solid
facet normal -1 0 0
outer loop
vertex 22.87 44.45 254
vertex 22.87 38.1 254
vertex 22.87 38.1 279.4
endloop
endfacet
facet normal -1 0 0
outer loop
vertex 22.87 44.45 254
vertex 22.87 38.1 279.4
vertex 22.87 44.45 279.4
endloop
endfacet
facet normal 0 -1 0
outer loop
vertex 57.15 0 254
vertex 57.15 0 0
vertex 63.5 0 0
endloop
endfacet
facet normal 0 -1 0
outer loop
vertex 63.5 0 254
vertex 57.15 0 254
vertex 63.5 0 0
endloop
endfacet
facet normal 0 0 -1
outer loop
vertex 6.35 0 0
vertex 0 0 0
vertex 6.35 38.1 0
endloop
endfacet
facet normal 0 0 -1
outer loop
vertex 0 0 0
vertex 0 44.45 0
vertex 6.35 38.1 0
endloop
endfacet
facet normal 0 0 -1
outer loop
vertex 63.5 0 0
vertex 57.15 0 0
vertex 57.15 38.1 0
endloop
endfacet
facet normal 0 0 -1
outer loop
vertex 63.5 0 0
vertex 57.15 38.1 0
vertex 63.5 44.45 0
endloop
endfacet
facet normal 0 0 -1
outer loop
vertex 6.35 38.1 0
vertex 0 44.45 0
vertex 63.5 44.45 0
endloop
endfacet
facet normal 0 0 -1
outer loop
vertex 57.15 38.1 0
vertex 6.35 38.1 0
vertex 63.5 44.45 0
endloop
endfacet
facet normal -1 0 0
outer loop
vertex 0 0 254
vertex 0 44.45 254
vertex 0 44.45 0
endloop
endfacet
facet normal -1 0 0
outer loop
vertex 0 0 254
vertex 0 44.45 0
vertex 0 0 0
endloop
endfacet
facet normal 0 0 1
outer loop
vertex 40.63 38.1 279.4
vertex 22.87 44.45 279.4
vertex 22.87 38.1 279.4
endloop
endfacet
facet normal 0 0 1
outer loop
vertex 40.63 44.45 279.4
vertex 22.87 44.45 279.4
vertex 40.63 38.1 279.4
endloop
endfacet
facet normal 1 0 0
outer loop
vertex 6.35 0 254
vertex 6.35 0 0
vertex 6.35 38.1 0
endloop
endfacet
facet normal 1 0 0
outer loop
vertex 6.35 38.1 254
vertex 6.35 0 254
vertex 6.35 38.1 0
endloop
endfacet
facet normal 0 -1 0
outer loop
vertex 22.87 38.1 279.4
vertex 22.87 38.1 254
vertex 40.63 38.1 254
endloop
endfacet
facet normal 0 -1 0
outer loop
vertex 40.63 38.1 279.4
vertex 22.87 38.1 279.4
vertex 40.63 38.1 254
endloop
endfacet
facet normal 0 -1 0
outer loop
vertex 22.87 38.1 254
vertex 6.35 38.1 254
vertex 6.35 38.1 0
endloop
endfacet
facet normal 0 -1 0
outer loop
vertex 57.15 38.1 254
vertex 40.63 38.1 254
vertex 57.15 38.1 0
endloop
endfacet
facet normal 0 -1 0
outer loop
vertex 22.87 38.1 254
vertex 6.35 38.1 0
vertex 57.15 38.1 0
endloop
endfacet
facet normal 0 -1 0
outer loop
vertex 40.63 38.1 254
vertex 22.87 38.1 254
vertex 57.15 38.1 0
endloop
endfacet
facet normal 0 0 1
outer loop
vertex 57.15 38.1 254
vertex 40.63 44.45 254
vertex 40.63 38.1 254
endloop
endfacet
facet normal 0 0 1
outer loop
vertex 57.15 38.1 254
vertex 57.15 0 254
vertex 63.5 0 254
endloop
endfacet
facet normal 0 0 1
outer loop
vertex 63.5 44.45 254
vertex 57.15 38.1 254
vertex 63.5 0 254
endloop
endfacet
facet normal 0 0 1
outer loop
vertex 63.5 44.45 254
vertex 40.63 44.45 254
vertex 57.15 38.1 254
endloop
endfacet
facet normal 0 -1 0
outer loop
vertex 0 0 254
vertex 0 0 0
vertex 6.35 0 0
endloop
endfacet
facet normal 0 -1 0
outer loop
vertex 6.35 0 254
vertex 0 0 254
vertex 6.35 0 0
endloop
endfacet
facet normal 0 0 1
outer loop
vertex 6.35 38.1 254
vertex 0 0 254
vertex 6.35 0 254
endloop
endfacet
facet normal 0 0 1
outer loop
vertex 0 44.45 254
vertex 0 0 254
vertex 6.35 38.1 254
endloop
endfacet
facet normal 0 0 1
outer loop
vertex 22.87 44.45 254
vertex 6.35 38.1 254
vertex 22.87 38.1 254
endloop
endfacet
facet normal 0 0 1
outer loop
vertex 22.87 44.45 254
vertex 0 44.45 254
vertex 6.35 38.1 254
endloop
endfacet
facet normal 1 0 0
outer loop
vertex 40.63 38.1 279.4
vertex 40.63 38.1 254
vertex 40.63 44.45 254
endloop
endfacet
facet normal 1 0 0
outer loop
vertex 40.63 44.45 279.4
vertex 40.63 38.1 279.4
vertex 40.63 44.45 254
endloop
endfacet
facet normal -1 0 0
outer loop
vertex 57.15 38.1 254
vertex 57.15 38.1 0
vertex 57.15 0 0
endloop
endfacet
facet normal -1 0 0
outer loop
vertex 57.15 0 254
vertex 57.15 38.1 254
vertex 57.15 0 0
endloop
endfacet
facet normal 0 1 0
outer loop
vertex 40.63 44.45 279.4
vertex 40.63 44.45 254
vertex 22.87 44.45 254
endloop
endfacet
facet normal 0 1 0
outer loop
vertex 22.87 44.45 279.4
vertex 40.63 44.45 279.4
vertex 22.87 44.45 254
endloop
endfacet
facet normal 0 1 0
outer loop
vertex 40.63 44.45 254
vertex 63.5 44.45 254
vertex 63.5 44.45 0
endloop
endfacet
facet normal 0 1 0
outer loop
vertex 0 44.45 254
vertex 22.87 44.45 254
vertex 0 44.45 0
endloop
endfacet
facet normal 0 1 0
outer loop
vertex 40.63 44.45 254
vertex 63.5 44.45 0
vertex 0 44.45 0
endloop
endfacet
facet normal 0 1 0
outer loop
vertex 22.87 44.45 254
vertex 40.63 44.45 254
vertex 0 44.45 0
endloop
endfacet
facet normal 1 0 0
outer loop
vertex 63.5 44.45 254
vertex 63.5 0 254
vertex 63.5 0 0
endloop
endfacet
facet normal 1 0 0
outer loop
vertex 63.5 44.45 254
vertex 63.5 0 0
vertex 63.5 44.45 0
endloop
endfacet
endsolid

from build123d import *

# Parameters (mm, degrees)
BOSS_EXTRUDE1_DEPTH = 254
SKETCH2_W           = 17.759293508
SKETCH2_H           = 6.35
BOSS_EXTRUDE2_DEPTH = 25.4


with BuildPart() as part:
    # Sketch1 → Boss-Extrude1 (new body)
    with BuildSketch(Plane.XY):
        Polygon((0, 0), (6.35, 0), (6.35, 38.1), (57.15, 38.1), (57.15, 0), (63.5, 0), (63.5, 44.45), (57.15, 44.45), (6.35, 44.45), (0, 44.45), align=None)
    extrude(amount=BOSS_EXTRUDE1_DEPTH)

    # Sketch2 → Boss-Extrude2 (add)
    with BuildSketch(Plane.XY.offset(254)):
        with Locations((31.75, 41.275)):
            Rectangle(SKETCH2_W, SKETCH2_H)
    extrude(amount=BOSS_EXTRUDE2_DEPTH)


solid = part.part
